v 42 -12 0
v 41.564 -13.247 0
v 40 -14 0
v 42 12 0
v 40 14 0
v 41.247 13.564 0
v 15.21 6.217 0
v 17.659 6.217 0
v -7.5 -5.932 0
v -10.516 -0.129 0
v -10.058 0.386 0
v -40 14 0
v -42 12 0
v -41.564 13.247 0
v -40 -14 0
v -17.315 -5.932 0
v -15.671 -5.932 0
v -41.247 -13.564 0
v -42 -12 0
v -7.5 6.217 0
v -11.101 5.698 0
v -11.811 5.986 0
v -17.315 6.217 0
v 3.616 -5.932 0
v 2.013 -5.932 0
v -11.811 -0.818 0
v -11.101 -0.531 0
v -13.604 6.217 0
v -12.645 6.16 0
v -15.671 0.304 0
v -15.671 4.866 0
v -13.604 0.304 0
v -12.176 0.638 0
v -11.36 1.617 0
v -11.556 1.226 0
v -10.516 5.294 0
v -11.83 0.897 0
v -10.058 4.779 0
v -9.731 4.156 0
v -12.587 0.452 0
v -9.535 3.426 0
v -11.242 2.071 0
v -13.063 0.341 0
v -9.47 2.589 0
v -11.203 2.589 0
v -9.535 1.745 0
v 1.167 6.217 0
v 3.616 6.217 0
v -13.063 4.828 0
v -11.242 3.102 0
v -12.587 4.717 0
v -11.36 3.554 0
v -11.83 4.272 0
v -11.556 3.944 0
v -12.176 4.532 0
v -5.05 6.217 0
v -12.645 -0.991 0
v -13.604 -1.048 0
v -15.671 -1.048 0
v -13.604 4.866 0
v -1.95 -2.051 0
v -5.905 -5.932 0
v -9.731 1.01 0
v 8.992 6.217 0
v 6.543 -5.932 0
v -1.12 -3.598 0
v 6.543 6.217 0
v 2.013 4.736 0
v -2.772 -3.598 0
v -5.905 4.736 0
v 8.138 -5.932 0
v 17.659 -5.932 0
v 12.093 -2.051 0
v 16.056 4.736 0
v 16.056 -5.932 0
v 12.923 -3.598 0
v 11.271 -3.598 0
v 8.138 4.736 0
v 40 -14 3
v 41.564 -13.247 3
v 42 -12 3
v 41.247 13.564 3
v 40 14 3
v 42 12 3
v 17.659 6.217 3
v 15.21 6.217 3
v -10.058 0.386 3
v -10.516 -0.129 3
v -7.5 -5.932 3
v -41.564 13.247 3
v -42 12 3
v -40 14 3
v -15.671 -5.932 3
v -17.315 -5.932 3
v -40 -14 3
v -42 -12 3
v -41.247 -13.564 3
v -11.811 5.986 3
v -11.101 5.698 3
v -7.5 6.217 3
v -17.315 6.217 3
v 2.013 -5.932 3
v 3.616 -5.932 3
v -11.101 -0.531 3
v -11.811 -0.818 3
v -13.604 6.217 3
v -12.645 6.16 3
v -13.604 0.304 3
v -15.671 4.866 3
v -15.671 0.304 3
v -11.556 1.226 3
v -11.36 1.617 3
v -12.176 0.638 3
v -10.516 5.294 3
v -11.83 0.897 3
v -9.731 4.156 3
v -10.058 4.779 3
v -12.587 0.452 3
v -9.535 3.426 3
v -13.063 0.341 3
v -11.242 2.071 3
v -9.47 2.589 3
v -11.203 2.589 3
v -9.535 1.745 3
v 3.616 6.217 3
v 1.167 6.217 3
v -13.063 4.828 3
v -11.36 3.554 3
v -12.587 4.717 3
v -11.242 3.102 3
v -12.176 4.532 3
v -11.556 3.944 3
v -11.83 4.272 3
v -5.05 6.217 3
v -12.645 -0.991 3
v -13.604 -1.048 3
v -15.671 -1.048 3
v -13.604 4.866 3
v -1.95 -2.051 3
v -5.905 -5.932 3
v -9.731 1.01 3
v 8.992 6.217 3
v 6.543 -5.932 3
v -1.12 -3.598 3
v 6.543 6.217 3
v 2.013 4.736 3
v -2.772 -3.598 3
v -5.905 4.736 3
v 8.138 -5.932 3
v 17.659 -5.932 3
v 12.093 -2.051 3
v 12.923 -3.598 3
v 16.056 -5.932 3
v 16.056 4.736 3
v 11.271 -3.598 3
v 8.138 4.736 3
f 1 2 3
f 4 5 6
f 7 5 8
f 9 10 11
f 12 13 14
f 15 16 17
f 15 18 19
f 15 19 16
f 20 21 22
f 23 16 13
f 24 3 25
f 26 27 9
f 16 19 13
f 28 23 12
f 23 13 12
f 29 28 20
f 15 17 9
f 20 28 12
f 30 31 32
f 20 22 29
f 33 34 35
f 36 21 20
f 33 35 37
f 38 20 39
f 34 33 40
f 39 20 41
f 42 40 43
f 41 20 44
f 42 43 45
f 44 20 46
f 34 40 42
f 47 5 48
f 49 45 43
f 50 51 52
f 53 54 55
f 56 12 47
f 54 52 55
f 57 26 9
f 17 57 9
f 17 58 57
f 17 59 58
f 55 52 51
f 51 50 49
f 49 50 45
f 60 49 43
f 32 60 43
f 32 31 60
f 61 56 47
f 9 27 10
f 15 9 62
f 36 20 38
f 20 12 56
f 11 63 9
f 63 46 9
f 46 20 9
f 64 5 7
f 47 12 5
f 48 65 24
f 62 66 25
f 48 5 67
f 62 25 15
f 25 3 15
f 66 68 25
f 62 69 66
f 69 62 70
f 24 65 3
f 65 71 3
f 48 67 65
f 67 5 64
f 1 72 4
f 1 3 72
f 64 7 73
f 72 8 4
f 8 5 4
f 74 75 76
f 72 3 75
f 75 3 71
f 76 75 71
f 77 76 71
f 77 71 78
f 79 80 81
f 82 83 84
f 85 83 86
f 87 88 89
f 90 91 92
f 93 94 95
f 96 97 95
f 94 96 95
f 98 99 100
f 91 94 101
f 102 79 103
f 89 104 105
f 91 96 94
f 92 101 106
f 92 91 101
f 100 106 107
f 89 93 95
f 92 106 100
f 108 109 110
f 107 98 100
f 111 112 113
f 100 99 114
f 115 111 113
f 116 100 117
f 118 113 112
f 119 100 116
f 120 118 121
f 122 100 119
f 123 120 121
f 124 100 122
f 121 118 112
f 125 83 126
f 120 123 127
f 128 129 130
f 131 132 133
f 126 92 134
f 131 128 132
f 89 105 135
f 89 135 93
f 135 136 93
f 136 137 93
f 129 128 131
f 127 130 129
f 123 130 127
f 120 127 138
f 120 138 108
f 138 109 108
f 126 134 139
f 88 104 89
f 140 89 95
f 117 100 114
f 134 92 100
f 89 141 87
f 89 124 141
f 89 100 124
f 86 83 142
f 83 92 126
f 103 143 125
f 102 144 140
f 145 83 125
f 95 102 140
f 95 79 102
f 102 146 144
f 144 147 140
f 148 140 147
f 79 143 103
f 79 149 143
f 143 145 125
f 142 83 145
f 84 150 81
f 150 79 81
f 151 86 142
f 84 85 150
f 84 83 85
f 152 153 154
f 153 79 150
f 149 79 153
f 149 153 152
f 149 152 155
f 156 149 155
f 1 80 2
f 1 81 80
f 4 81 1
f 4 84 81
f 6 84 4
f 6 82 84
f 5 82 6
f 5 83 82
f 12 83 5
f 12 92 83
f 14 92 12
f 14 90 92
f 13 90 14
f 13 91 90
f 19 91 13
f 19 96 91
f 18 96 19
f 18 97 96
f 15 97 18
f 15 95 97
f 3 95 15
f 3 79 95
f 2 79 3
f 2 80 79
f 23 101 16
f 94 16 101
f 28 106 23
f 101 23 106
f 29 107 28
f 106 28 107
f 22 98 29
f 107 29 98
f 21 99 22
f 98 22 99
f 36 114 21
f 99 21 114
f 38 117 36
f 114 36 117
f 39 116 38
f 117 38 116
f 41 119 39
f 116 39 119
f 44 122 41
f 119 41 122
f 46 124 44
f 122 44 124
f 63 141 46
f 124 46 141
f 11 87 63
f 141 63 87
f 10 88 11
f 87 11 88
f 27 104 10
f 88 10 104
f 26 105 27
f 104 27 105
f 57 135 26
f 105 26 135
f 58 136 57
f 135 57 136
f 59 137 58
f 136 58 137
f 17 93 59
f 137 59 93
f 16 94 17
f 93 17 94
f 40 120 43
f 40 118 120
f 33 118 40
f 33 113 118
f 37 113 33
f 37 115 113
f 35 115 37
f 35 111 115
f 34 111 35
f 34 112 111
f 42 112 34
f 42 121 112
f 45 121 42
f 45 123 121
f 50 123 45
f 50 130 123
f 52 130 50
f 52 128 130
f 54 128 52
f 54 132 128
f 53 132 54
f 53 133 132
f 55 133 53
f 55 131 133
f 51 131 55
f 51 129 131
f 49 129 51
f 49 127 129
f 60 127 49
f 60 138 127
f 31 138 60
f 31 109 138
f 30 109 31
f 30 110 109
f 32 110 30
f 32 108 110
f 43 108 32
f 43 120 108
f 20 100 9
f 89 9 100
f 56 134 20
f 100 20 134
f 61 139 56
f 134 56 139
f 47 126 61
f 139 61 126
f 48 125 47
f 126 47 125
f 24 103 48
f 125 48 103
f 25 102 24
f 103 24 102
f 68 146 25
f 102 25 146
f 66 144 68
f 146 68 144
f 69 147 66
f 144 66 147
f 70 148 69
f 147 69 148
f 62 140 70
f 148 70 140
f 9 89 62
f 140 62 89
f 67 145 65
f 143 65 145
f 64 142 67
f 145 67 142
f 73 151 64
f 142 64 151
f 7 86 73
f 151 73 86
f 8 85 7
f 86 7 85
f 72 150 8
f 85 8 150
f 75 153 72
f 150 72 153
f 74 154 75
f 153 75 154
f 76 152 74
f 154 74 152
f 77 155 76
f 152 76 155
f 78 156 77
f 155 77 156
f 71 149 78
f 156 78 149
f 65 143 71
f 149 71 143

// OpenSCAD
// PMM font picker pattern.
// Provenance: official release v0.10.0.
// Evidence: forum.bambulab.com/t/parametric-model-maker-v0-10-0-multi-plate-3mf-generation/144618

text_value = "PMM";
font_name = "Roboto"; // font
plate_width = 80;
plate_height = 24;

linear_extrude(3)
difference() {
    offset(r = 2)
        square([plate_width, plate_height], center = true);
    text(text_value, font = font_name, size = 12, halign = "center", valign = "center");
}
